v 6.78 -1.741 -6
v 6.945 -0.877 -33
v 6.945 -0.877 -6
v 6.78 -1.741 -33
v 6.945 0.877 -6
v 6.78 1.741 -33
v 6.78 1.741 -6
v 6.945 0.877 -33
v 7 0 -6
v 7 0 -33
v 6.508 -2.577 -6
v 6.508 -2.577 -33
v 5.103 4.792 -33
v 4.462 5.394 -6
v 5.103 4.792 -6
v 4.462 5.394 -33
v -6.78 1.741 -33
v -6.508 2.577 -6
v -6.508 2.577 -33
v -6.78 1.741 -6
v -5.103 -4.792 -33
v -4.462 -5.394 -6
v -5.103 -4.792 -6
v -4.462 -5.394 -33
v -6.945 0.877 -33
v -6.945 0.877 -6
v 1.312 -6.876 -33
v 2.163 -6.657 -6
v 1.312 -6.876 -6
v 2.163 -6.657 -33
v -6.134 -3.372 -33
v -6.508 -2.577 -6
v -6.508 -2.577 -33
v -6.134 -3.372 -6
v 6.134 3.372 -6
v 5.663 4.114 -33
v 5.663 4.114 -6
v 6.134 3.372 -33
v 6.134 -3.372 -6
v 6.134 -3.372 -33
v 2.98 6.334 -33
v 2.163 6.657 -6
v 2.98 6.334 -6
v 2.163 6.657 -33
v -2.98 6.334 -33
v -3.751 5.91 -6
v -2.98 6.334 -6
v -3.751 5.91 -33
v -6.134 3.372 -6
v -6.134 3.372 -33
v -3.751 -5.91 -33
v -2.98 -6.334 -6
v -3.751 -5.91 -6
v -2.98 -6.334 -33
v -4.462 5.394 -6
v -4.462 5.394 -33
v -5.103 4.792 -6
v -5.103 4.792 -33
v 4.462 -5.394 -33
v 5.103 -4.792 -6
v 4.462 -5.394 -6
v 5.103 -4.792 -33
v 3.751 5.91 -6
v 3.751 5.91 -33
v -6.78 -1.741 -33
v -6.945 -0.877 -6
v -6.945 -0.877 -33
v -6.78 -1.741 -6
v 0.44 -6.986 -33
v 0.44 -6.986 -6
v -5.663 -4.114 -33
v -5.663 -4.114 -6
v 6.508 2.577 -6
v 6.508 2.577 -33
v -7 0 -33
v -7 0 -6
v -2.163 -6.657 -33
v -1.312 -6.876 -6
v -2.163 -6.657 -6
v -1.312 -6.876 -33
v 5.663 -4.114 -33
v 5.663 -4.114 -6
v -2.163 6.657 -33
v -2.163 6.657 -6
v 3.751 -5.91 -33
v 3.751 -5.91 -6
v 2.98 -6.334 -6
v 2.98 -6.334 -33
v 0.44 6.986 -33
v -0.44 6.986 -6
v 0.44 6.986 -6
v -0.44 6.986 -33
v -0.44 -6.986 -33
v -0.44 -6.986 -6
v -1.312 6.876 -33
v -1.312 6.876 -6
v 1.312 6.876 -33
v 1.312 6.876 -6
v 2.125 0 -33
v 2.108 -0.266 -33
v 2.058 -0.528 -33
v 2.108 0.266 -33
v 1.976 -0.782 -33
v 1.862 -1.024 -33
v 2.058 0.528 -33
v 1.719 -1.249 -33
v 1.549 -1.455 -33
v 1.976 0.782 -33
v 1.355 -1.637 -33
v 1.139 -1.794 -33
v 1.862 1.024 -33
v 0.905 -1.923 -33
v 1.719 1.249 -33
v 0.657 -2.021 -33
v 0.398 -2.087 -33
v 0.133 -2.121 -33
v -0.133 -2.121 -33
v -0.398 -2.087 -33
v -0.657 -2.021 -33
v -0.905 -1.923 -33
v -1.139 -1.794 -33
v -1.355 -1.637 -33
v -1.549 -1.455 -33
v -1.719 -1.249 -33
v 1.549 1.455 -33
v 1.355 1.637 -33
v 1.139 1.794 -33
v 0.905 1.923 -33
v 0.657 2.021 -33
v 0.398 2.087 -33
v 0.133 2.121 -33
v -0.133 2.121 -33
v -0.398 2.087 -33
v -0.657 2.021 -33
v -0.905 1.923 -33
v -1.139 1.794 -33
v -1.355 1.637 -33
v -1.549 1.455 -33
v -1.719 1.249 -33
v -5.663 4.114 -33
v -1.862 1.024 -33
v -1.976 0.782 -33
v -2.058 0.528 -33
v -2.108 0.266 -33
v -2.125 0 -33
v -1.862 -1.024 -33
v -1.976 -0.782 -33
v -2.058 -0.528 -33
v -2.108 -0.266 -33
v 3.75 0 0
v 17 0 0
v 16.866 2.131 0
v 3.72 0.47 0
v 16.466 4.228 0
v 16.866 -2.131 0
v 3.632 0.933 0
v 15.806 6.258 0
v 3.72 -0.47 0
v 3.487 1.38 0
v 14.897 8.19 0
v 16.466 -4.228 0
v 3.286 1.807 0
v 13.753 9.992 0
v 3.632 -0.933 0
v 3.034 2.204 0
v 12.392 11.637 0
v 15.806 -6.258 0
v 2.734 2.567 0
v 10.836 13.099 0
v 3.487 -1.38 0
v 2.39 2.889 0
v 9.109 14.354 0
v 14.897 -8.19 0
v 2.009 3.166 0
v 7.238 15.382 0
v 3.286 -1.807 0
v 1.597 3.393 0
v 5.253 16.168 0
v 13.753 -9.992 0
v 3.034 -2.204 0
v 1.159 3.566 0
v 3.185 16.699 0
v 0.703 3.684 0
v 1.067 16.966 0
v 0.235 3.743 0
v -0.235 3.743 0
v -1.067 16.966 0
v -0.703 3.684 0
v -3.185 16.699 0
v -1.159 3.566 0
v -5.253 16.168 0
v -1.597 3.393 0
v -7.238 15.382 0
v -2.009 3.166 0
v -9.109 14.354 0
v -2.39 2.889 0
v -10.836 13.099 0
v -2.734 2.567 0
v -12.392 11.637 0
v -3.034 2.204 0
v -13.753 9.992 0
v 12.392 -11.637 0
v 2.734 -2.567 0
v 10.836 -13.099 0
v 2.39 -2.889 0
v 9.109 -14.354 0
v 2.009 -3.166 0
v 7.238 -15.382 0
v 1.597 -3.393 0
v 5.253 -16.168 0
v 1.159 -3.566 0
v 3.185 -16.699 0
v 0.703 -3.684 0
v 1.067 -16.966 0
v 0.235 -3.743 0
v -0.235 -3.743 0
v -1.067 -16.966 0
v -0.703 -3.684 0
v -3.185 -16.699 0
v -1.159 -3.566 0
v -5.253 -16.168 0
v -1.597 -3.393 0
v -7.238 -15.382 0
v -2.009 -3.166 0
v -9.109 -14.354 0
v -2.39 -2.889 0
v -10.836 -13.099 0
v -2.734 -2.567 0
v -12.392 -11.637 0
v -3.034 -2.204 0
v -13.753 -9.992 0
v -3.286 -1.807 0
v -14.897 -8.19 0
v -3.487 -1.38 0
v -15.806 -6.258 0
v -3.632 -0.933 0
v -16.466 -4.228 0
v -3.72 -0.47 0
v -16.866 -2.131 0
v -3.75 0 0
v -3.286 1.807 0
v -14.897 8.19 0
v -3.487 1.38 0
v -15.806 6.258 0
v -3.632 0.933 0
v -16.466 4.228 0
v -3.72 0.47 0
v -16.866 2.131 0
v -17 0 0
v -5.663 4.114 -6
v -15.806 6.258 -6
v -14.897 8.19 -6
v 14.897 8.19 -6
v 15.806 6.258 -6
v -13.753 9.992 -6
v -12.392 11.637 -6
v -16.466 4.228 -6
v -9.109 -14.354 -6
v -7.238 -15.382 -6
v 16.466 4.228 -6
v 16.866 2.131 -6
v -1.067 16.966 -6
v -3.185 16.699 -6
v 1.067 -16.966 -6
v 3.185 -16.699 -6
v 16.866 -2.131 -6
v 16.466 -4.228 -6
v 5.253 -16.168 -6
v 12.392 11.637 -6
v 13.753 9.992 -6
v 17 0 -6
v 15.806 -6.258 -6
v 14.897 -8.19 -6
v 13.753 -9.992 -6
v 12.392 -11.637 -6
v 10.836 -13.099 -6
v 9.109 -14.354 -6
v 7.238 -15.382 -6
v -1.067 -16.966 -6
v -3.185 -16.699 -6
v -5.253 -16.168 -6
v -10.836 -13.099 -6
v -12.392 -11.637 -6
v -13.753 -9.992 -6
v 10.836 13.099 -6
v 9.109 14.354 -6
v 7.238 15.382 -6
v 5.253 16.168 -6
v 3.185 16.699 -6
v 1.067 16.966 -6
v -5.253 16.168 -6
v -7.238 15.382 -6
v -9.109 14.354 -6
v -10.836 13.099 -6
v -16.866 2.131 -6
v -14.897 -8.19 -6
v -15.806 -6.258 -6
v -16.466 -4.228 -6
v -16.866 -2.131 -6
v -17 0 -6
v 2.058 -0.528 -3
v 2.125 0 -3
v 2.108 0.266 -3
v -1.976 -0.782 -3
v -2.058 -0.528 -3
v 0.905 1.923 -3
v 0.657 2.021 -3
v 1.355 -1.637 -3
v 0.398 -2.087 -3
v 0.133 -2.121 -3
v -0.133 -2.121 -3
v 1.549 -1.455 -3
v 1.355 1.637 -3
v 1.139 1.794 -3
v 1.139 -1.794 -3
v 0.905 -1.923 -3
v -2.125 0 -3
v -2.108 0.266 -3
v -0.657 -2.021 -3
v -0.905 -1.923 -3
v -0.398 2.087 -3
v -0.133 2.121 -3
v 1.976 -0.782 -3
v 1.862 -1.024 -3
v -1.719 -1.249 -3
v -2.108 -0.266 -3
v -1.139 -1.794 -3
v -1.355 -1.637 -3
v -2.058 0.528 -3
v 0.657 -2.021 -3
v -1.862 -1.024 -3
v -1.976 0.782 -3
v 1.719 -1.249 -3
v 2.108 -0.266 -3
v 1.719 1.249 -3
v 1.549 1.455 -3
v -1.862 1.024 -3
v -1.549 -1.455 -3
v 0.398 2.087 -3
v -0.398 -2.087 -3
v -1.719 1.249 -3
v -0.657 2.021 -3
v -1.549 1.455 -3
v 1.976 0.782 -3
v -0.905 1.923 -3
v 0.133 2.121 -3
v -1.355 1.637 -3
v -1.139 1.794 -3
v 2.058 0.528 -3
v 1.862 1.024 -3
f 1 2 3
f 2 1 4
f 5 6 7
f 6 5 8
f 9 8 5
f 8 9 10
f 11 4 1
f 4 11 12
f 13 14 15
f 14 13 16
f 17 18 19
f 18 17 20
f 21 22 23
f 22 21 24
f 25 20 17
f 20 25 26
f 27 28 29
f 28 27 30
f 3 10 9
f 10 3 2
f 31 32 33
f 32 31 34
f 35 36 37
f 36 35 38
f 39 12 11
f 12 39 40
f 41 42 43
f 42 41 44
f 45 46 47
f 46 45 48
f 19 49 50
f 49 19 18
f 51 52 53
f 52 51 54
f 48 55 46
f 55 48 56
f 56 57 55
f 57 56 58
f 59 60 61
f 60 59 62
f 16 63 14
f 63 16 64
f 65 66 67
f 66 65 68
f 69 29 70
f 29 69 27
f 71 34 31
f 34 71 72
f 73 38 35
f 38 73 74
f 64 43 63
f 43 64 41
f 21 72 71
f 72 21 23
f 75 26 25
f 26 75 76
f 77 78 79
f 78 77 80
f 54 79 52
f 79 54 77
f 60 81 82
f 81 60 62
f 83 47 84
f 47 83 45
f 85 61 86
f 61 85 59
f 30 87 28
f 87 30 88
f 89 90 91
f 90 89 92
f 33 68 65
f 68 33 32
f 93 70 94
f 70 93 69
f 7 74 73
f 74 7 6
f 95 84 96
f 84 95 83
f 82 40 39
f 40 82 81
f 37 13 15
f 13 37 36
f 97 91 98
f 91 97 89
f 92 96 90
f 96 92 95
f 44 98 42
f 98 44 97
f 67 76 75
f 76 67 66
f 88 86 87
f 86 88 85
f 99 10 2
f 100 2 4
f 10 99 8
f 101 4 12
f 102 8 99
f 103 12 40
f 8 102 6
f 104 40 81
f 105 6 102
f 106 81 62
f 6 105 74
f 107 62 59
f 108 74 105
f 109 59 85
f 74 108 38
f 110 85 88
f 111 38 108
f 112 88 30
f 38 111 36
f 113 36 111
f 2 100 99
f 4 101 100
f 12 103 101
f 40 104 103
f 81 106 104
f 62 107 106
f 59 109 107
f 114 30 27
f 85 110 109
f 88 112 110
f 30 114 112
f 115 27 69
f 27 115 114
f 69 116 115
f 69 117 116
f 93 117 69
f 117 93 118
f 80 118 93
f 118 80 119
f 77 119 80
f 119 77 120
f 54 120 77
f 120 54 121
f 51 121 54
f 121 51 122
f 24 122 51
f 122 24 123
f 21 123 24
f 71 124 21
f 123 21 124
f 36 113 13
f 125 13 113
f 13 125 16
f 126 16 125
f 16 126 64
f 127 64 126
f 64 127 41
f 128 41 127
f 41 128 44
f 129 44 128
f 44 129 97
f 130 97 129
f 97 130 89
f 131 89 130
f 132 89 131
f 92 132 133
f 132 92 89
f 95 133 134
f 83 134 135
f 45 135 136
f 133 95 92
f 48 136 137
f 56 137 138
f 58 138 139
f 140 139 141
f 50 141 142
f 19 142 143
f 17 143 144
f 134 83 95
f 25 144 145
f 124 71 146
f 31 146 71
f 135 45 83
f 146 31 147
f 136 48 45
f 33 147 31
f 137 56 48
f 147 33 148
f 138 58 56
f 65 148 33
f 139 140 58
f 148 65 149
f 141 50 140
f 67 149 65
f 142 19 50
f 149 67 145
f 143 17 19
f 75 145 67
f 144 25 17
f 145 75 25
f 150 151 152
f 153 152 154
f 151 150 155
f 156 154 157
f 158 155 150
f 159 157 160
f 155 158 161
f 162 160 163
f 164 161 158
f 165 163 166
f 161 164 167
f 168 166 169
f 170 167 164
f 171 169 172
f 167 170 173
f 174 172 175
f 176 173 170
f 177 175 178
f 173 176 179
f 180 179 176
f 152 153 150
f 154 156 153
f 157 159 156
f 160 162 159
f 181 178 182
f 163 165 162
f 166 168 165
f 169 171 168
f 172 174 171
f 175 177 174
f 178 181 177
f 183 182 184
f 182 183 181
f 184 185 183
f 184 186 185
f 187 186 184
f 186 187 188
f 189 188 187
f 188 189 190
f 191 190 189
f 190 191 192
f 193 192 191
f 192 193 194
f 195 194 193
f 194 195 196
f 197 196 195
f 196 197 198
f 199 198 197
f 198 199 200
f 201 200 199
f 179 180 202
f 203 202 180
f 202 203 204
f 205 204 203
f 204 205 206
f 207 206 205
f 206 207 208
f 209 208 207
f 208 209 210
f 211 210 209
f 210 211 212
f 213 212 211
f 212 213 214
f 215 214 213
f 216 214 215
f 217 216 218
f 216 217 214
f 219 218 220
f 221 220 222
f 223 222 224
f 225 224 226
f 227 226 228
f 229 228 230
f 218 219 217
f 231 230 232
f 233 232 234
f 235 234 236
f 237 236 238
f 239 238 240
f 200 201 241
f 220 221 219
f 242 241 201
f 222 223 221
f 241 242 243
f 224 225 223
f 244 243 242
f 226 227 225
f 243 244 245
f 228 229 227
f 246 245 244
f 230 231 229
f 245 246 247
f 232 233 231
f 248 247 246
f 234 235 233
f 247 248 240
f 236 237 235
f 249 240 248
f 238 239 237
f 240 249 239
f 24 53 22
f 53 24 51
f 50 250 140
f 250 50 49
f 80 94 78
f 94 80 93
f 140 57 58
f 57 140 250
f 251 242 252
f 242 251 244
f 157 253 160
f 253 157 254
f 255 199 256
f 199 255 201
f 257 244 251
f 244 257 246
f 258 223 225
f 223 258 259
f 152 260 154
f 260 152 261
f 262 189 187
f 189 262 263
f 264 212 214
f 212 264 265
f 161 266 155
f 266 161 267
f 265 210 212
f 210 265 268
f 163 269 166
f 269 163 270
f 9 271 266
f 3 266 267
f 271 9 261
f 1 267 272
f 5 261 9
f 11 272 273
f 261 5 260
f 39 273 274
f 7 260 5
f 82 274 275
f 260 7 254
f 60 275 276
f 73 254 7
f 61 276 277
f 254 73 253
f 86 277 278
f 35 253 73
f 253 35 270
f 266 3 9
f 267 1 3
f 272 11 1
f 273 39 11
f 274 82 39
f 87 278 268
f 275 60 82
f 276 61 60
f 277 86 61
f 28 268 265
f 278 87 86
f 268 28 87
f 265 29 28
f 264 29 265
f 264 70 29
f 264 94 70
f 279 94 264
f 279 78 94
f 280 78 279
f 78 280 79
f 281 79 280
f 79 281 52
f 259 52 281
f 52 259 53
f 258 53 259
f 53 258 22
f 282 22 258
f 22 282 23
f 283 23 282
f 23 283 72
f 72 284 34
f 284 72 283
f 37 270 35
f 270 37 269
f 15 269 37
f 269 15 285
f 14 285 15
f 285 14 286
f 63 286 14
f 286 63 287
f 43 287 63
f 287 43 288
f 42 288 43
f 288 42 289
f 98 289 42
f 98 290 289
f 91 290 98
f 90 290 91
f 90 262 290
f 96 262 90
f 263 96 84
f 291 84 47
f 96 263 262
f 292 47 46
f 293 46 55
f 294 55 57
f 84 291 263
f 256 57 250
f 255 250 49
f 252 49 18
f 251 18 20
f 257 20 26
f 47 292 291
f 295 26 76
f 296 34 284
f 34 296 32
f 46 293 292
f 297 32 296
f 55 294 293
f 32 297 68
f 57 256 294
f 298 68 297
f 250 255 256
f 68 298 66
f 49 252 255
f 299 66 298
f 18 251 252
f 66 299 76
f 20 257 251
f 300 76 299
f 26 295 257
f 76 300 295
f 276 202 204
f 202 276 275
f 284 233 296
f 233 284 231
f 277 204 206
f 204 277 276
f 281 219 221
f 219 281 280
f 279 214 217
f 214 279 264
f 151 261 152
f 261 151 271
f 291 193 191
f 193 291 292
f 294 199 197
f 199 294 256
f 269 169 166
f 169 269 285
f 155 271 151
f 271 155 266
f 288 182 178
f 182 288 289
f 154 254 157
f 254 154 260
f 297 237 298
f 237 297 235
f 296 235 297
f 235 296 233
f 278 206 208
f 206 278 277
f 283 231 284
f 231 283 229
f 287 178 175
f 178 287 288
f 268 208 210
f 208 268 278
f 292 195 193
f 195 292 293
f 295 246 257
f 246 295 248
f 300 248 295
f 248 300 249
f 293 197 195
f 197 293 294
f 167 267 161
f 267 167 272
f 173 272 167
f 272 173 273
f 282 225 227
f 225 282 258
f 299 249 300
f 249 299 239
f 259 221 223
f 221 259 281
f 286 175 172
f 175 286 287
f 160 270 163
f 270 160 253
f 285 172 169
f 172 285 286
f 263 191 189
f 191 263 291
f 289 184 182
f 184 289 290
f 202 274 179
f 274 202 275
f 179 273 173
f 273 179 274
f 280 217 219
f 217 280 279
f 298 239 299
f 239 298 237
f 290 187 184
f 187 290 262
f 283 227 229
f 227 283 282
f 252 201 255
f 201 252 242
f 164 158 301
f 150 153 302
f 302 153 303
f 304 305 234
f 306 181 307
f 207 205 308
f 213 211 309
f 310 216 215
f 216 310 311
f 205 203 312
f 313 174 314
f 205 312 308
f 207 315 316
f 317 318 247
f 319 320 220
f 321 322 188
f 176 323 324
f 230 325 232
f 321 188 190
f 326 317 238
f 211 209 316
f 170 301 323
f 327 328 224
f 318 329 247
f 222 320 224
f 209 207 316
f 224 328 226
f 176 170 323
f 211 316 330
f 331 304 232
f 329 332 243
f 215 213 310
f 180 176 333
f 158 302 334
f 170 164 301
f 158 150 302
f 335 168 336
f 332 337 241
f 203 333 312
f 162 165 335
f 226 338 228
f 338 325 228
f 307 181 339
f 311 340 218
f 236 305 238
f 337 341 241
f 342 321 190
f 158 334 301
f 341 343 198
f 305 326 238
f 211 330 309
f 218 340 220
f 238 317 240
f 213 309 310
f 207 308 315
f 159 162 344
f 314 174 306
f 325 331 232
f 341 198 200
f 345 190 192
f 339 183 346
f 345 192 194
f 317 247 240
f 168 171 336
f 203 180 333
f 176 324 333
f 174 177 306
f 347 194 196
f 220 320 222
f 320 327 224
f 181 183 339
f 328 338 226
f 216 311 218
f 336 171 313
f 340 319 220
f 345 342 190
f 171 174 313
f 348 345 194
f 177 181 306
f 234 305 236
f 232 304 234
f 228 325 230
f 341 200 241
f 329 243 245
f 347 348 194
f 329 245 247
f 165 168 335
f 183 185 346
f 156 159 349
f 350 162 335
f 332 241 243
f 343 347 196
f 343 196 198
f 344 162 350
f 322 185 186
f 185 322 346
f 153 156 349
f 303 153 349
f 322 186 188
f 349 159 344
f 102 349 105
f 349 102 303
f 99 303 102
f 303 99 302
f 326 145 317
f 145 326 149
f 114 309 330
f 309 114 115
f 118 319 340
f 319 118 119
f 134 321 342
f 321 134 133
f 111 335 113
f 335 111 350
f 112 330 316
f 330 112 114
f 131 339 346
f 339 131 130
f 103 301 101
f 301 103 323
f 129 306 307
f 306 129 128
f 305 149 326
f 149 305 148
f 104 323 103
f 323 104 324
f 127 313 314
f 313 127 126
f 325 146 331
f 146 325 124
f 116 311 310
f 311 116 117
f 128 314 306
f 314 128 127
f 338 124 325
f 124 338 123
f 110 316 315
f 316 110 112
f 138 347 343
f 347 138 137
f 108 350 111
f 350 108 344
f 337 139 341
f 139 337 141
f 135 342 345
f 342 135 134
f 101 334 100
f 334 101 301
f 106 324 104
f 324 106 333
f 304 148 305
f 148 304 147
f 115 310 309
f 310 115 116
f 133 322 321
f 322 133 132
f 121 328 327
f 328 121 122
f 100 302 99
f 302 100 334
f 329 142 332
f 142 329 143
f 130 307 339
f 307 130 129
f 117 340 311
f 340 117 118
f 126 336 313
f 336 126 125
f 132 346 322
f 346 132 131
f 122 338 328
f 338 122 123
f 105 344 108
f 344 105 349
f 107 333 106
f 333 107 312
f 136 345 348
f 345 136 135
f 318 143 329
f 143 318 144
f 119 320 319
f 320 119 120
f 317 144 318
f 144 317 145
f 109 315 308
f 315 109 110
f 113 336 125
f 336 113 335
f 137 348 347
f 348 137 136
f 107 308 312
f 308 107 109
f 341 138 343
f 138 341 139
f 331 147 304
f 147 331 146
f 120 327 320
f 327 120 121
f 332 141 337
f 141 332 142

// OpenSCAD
$fn = 50;


difference() {
	union() {
		translate(v = [0, 0, -33.0000000000]) {
			cylinder(h = 33, r = 7.0000000000);
		}
		translate(v = [0, 0, -6.0000000000]) {
			cylinder(h = 6, r = 17.0000000000);
		}
	}
	union() {
		translate(v = [0, 0, 0]) {
			rotate(a = [0, 0, 0]) {
				difference() {
					union() {
						#translate(v = [0, 0, -33.0000000000]) {
							cylinder(h = 33, r = 2.0000000000);
						}
						#translate(v = [0, 0, -3]) {
							cylinder(h = 3, r1 = 2.1250000000, r2 = 3.7500000000);
						}
						#translate(v = [0, 0, -33.0000000000]) {
							cylinder(h = 33, r = 2.1250000000);
						}
						#translate(v = [0, 0, -33.0000000000]) {
							cylinder(h = 33, r = 2.0000000000);
						}
					}
					union();
				}
			}
		}
	}
}
